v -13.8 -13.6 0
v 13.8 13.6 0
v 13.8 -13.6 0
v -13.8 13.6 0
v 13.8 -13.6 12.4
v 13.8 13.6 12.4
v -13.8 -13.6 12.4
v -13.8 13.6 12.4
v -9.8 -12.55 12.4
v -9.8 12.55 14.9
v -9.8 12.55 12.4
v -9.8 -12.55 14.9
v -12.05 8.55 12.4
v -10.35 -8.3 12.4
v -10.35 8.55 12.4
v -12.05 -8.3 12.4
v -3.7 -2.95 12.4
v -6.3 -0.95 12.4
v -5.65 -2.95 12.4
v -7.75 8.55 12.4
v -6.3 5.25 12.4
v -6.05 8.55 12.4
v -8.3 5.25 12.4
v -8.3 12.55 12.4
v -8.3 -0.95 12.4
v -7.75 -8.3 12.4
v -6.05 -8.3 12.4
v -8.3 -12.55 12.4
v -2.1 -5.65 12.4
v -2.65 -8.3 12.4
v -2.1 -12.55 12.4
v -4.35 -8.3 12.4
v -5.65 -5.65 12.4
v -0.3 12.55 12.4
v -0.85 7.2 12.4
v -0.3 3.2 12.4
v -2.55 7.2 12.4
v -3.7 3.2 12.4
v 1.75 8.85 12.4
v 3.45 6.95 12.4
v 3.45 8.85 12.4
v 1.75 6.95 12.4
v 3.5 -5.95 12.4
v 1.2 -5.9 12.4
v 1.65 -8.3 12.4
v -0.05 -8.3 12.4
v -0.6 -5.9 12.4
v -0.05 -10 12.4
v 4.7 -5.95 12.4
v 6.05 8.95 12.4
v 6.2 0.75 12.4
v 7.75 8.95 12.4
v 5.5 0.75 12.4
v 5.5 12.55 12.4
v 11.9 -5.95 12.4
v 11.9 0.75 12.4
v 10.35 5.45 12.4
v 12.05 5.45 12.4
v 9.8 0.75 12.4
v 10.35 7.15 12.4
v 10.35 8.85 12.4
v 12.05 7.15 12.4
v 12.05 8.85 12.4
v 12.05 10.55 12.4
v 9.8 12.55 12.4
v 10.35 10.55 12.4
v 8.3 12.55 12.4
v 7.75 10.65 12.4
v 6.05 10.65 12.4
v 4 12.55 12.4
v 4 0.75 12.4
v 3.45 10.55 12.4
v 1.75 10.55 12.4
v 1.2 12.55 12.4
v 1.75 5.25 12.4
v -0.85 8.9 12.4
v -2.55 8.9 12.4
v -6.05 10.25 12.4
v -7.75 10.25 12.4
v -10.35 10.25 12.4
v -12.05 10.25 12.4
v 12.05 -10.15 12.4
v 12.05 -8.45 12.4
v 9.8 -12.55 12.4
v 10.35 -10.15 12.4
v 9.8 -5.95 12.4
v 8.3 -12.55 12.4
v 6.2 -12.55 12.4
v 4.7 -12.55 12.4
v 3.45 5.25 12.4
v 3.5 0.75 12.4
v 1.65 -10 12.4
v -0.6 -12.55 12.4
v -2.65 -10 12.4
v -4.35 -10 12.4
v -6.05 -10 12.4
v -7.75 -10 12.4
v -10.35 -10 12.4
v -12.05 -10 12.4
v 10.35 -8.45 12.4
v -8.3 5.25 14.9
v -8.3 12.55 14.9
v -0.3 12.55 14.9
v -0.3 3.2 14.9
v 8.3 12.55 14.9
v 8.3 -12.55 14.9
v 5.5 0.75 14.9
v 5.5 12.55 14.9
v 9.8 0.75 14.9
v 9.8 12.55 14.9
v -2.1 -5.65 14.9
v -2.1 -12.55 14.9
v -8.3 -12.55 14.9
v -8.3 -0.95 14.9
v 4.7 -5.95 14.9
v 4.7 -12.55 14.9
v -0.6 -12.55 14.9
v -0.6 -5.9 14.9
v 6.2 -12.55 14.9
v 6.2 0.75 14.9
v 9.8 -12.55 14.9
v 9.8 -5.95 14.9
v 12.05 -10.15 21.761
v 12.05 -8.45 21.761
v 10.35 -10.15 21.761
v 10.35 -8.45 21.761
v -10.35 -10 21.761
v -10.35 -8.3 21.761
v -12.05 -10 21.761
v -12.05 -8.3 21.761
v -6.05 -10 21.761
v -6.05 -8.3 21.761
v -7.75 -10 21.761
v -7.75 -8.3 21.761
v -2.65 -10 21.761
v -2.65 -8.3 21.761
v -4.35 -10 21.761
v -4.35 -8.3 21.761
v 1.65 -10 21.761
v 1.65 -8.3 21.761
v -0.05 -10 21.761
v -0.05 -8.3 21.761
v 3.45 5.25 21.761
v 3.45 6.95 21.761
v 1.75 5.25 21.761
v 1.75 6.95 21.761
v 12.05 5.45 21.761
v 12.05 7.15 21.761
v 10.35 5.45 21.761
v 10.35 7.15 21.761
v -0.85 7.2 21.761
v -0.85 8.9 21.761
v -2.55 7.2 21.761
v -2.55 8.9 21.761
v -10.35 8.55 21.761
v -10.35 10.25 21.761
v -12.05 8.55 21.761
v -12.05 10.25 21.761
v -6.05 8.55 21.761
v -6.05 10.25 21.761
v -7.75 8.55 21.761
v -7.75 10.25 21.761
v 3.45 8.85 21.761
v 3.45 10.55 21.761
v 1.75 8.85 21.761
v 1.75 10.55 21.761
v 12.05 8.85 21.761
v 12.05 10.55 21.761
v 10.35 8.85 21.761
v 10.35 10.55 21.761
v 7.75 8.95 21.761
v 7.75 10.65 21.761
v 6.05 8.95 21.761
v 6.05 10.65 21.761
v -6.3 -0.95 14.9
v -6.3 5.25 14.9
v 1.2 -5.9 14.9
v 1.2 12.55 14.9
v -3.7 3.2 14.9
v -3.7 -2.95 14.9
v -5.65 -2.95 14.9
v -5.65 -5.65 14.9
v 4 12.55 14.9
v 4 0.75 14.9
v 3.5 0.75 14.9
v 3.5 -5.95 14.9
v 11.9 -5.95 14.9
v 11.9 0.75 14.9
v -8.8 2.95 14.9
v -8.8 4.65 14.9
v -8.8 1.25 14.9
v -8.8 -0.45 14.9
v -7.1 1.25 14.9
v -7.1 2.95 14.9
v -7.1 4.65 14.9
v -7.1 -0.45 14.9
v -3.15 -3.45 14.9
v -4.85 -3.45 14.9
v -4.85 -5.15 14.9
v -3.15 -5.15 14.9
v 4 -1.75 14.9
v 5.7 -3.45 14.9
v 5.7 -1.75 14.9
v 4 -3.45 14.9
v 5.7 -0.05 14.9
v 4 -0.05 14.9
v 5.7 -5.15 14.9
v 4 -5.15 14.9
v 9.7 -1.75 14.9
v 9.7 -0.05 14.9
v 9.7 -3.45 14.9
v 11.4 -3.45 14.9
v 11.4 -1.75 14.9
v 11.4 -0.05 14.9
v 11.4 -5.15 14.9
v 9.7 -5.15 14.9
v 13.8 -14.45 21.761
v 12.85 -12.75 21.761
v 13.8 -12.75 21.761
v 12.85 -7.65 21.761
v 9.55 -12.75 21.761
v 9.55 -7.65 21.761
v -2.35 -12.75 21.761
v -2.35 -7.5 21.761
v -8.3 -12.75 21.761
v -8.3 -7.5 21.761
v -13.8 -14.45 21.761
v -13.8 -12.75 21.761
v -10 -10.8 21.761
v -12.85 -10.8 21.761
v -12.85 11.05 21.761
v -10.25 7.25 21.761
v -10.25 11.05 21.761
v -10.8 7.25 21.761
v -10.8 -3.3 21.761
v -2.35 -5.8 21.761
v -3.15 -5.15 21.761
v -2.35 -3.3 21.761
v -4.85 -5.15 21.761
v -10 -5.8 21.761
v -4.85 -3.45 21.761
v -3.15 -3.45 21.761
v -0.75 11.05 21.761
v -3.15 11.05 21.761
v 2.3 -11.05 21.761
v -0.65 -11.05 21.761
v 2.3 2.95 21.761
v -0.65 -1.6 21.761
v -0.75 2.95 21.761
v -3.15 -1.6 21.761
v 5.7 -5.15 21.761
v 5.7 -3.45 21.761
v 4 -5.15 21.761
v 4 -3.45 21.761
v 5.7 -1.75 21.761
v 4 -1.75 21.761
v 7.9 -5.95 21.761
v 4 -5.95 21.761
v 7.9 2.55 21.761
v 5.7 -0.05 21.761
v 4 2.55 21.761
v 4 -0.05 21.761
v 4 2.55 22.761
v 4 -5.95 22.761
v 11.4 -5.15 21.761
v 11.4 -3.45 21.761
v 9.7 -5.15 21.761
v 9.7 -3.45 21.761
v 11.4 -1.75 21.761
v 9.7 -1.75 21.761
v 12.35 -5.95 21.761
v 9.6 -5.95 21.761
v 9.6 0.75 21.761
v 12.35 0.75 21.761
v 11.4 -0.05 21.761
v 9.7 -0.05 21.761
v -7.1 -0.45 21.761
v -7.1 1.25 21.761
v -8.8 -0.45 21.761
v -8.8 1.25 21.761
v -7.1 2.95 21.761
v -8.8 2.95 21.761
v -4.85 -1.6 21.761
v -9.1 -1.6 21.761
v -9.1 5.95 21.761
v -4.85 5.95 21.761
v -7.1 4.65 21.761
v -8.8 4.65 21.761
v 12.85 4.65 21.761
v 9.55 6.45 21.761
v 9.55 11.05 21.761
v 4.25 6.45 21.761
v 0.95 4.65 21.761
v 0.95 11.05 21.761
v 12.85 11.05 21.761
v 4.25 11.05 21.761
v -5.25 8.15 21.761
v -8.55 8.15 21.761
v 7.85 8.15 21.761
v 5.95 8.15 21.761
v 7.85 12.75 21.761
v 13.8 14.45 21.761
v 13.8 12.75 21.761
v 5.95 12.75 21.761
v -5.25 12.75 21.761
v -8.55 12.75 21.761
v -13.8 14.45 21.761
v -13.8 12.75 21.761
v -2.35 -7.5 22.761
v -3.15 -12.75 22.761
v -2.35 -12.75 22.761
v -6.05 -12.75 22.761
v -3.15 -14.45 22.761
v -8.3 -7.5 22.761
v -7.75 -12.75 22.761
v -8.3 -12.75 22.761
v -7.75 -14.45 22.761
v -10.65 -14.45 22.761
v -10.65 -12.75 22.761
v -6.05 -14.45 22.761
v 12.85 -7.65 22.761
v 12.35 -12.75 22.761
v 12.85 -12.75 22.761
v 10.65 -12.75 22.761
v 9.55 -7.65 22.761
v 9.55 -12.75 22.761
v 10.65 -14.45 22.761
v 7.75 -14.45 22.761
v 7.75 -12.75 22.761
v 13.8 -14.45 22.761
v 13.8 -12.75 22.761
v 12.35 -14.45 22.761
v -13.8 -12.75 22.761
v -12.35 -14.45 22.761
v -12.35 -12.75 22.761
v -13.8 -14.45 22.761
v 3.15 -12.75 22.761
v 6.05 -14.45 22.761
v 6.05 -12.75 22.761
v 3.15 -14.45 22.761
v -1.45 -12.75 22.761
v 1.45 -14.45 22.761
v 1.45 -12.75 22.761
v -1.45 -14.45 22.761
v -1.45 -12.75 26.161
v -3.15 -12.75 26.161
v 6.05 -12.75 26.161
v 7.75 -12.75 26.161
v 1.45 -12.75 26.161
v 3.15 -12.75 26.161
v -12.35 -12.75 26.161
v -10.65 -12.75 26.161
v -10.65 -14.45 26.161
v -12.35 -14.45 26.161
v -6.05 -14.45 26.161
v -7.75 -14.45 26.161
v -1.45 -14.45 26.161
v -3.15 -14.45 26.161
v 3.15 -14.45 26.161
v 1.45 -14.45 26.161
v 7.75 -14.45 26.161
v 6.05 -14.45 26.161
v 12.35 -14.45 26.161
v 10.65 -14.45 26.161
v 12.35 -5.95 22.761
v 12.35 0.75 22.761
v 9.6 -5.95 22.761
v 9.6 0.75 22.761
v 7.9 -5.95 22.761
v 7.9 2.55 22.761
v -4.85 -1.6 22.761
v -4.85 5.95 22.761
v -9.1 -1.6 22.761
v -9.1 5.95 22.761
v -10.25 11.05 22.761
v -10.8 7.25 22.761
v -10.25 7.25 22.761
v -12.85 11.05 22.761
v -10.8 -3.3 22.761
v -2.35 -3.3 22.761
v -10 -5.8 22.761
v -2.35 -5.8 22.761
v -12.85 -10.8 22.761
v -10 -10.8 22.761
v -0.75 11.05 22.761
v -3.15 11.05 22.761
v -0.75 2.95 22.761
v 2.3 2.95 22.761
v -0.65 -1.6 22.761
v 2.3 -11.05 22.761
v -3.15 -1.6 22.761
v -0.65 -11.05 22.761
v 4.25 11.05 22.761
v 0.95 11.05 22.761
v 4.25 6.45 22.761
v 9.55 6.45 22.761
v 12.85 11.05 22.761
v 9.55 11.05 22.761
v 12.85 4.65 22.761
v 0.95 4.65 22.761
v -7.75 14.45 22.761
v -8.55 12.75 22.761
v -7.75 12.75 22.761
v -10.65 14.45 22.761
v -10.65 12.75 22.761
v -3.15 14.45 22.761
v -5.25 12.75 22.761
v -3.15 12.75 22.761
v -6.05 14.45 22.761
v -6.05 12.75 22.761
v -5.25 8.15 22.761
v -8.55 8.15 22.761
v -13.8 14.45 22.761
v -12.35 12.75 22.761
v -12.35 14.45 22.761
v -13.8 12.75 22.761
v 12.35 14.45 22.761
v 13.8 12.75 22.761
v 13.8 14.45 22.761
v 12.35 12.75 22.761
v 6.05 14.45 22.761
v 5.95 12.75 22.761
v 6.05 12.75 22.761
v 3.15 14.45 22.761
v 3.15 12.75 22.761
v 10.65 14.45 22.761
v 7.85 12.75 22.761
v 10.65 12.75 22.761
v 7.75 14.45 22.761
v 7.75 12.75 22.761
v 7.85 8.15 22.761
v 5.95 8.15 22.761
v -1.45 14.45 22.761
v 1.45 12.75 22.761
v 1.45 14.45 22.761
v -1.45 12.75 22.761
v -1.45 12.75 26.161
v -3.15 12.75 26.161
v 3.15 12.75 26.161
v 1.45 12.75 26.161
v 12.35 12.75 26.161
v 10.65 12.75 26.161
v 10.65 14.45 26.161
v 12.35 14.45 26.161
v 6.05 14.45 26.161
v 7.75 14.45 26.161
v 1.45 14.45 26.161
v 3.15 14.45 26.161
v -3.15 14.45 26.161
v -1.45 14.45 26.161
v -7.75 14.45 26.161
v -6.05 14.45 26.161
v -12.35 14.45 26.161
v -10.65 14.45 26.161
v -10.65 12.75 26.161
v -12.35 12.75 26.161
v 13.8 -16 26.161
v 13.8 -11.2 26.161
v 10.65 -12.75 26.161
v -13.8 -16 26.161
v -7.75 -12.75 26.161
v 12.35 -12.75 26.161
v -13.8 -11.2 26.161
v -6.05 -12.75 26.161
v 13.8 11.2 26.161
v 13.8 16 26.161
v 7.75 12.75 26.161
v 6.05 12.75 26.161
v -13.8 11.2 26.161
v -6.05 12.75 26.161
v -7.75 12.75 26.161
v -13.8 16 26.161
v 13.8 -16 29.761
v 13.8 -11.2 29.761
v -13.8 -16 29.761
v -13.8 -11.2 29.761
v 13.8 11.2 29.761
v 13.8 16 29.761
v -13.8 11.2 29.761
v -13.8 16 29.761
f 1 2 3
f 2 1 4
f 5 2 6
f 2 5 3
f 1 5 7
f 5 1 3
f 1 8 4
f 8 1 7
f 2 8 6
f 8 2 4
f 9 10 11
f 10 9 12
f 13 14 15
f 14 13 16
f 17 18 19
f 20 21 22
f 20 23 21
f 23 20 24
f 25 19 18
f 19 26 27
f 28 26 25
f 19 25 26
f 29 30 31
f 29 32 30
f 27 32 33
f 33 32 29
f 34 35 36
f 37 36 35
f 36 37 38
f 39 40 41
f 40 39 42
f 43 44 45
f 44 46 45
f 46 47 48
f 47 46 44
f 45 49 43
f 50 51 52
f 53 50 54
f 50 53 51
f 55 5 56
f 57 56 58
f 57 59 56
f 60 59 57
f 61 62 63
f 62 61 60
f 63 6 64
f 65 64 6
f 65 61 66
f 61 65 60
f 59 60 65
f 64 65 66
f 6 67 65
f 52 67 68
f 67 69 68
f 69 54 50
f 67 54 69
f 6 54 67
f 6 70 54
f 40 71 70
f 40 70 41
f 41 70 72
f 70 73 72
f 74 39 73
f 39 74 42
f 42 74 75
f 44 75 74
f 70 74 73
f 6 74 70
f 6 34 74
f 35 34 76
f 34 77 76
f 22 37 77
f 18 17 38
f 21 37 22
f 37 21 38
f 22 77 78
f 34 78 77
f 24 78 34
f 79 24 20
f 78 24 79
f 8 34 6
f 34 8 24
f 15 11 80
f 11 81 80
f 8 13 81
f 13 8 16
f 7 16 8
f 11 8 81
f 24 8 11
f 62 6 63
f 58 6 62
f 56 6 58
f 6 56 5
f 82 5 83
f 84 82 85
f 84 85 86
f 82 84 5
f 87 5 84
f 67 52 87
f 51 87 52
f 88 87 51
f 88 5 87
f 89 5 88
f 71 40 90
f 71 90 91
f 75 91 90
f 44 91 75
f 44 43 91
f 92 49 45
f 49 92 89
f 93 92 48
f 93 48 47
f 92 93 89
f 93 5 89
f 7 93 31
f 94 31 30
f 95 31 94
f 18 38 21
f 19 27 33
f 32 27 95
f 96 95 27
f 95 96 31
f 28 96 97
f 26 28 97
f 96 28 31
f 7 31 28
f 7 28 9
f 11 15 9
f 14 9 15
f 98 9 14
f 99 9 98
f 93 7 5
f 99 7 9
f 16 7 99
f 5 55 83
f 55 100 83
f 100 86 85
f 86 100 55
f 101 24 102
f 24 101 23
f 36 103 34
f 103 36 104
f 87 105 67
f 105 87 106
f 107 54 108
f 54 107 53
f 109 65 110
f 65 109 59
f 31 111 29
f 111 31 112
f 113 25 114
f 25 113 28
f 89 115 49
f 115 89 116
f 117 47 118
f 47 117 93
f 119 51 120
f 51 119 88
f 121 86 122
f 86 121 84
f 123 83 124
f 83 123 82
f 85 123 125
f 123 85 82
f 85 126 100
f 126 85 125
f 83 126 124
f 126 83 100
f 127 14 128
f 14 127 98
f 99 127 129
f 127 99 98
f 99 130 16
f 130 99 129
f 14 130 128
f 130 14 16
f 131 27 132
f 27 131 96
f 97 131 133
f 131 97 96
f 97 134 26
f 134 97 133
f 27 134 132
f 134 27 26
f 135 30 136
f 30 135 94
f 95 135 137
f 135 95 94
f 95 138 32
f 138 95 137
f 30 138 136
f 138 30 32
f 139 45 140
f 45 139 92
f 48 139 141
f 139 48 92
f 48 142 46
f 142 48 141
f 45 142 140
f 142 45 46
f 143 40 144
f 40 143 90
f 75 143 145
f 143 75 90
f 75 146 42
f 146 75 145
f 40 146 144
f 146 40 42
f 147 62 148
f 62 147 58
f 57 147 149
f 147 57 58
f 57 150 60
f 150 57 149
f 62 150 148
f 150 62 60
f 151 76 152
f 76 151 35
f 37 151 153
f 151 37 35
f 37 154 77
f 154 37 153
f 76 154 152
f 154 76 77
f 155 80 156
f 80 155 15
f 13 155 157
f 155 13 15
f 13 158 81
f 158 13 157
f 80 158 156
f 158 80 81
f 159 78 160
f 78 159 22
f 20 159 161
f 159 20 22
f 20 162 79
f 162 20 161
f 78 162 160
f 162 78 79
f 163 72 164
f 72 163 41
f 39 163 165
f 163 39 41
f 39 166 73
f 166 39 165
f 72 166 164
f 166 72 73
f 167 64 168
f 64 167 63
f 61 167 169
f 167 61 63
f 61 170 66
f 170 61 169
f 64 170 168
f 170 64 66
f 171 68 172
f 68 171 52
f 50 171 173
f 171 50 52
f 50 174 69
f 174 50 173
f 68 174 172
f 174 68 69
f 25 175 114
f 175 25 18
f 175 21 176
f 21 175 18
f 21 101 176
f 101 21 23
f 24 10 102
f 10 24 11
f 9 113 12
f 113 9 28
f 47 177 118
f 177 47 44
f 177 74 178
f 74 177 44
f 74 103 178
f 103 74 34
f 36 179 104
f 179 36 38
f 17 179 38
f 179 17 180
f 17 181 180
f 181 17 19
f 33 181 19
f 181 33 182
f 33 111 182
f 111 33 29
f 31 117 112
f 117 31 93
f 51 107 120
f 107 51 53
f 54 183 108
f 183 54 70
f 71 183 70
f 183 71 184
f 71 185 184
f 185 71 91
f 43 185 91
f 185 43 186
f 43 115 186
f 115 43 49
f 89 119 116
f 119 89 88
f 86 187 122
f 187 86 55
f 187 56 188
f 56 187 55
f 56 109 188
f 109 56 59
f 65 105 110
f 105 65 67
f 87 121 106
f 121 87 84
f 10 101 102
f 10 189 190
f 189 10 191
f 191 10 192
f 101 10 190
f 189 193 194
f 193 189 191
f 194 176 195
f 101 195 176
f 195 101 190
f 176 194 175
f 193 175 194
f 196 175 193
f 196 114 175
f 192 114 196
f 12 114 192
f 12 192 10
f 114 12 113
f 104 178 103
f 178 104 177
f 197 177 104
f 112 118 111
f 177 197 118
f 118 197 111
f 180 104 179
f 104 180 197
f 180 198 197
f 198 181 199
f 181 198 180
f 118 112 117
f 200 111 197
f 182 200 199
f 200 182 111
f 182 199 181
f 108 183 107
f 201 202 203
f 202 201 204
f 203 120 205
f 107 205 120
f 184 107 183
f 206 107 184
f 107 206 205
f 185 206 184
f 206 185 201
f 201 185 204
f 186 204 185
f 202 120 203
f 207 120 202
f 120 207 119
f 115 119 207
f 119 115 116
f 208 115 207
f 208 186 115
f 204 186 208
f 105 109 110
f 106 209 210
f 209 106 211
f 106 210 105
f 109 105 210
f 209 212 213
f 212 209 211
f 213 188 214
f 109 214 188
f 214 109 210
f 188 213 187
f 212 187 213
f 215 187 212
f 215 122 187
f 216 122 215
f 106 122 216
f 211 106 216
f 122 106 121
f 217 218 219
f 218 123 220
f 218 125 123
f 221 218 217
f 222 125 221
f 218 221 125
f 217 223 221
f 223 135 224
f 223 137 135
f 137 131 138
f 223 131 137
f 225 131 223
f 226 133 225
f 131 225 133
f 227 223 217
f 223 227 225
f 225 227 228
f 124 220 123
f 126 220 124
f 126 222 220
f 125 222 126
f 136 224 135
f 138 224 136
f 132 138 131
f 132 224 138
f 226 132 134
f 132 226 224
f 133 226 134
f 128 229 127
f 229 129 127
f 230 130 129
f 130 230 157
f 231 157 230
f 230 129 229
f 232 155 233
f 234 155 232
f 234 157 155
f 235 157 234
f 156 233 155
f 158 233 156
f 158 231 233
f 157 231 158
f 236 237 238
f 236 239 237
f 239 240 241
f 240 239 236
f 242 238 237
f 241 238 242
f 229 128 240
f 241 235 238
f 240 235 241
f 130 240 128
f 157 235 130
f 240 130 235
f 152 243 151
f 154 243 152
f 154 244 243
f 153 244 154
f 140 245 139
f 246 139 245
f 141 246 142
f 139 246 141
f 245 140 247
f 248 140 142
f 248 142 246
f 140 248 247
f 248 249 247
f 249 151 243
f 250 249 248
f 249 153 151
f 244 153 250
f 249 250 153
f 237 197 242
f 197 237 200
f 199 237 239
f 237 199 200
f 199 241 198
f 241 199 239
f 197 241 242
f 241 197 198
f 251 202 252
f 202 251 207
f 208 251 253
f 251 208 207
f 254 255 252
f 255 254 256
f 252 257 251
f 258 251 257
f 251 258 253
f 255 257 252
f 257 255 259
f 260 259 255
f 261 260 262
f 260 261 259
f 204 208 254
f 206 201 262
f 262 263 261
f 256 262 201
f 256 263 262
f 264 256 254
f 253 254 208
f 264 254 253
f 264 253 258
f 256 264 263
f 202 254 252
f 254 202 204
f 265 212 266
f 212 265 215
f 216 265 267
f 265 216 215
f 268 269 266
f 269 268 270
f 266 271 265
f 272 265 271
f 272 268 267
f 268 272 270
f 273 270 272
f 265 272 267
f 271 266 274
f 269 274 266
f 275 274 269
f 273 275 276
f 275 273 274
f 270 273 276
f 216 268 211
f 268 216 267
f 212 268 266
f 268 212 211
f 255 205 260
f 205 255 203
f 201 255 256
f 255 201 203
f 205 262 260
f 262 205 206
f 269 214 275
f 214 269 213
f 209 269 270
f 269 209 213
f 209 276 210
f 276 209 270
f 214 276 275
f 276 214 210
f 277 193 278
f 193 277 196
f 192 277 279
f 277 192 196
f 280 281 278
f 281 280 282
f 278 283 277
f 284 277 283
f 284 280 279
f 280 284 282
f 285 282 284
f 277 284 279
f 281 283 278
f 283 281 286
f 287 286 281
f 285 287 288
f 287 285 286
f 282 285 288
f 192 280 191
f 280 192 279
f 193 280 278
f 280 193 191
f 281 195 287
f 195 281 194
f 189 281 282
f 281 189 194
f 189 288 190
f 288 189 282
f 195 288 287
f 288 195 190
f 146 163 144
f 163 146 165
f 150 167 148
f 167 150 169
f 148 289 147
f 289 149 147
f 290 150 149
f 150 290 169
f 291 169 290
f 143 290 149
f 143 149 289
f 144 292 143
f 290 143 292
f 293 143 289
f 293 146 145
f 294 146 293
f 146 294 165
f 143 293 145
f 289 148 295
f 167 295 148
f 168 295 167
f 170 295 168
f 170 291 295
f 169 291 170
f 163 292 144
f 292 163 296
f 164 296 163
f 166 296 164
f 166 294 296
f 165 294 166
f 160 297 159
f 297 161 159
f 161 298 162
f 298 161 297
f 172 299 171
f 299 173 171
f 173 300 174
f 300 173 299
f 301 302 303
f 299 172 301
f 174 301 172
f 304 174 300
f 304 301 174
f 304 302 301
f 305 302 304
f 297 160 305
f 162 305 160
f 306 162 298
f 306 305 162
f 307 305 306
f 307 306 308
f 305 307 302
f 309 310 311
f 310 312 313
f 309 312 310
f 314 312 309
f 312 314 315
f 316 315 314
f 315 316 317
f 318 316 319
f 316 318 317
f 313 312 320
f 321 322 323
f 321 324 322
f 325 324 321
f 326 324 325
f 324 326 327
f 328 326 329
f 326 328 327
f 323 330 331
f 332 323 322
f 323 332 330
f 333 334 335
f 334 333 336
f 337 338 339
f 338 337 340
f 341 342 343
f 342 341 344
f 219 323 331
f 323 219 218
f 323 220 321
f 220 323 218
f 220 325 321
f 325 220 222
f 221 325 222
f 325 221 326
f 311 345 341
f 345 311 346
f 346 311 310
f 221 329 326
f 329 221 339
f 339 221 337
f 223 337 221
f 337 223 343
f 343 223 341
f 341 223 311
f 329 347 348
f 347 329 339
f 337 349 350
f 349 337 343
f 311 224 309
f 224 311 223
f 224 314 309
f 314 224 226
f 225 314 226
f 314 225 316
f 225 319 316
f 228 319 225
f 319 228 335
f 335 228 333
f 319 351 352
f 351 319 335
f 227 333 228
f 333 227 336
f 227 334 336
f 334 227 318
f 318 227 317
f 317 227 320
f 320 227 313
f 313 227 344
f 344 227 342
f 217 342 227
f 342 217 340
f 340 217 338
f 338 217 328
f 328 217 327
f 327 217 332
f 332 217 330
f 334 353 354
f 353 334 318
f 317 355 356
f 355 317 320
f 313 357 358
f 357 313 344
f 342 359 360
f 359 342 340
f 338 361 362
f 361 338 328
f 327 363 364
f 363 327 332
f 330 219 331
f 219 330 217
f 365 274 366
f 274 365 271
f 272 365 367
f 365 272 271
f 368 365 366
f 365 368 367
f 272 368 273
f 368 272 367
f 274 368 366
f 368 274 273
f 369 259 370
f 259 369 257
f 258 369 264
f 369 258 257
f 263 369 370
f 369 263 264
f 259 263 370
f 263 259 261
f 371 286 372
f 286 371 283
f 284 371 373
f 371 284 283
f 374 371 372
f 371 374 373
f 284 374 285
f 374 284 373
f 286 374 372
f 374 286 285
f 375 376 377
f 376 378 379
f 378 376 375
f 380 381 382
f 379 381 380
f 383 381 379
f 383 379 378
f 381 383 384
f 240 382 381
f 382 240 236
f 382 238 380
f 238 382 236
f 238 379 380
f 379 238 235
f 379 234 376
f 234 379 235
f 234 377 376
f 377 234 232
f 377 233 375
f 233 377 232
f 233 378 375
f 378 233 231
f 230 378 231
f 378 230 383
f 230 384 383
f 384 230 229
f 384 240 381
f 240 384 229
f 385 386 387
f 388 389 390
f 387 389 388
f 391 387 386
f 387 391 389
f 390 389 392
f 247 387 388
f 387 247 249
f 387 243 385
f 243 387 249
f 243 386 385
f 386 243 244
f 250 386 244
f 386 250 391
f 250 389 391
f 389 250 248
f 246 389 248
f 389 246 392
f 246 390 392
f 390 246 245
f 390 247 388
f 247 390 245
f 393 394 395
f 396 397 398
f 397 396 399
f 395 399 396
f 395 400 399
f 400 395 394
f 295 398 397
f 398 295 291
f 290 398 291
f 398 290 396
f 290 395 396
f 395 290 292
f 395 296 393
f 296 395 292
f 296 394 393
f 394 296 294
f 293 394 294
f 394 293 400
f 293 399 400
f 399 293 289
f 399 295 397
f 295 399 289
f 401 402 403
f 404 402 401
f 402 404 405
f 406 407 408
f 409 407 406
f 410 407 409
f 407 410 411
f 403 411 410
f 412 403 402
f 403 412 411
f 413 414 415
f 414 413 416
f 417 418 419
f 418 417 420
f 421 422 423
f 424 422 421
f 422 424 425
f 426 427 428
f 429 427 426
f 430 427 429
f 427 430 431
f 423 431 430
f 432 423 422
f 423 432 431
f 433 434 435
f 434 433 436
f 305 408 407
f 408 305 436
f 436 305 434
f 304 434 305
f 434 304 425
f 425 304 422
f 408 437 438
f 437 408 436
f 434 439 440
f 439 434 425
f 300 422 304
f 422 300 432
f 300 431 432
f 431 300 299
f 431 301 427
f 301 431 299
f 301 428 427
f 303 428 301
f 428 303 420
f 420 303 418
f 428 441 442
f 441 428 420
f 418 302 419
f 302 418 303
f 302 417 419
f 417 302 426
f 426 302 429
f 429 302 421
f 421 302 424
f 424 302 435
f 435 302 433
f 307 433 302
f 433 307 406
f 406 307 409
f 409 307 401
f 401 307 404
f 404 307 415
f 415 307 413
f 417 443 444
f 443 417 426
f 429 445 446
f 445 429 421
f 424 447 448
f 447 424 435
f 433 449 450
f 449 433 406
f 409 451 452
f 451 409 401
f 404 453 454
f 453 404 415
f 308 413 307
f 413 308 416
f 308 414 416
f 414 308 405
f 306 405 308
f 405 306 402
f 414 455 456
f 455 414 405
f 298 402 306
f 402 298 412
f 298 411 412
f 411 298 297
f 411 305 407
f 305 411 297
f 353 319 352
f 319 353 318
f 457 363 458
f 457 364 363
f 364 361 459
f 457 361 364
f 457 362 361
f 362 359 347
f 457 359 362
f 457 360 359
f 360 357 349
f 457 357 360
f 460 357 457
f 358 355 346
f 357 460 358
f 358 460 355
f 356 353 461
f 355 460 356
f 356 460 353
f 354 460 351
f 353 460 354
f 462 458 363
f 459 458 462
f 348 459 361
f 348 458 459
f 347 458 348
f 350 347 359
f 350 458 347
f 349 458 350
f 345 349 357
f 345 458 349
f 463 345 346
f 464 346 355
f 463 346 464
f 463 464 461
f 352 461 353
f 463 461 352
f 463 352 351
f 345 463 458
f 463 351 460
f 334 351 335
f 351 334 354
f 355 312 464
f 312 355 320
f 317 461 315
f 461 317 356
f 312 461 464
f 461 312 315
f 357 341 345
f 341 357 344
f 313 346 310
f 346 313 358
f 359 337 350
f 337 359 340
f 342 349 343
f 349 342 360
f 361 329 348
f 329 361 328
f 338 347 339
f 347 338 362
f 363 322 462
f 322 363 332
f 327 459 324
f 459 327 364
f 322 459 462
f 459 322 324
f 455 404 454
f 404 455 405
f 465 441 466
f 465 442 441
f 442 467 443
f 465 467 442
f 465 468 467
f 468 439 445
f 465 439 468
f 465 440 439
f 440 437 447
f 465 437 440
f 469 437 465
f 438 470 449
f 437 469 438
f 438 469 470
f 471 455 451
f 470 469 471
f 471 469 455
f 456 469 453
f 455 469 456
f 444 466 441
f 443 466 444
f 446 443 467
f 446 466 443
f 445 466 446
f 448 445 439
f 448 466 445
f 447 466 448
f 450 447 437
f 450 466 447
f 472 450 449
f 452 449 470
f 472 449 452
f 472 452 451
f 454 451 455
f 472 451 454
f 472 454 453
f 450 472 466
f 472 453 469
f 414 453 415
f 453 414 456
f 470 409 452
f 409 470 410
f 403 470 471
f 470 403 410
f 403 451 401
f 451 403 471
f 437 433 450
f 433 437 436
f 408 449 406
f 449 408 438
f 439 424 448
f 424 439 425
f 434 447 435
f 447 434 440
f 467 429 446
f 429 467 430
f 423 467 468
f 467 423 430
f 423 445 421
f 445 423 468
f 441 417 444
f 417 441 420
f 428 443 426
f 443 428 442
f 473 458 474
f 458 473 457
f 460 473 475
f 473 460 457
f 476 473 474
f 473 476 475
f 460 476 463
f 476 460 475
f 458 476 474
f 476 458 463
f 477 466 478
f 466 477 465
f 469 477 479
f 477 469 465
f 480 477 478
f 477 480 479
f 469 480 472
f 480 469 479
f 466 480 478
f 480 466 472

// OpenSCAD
// Generated by SolidPython 0.4.2 on 2020-09-29 23:19:40
//!OpenSCAD

scale(v = 0.0100000000) {
	translate(v = [-1380, -1360, 0]) {
		union() {
			color(c = [0.4000000000, 0.4000000000, 0.4000000000]) {
				translate(v = [0, 0, 0]) {
					linear_extrude(height = 1000.0000000000) {
						polygon(paths = [[0, 1, 2, 3]], points = [[0, 0], [0, 2720], [2760, 2720], [2760, 0]]);
					}
				}
			}
			color(c = [0.2000000000, 0.6000000000, 0.2000000000]) {
				translate(v = [0, 0, 1000.0000000000]) {
					linear_extrude(height = 120.0000000000) {
						polygon(paths = [[0, 1, 2, 3]], points = [[0, 1305], [0, 2720], [2760, 2720], [2760, 1305]]);
					}
				}
			}
			color(c = [0.4000000000, 0.4000000000, 0.4000000000]) {
				translate(v = [0, 0, 1000.0000000000]) {
					linear_extrude(height = 120.0000000000) {
						polygon(paths = [[0, 1, 2, 3]], points = [[0, 0], [0, 1305], [2760, 1305], [2760, 0]]);
					}
				}
			}
			color(c = [0.9000000000, 0.6000000000, 0.6000000000]) {
				translate(v = [0, 0, 1120.0000000000]) {
					linear_extrude(height = 120.0000000000) {
						polygon(paths = [[0, 1, 2, 3]], points = [[135, 2065], [135, 2485], [400, 2485], [400, 2065]]);
					}
				}
			}
			color(c = [0.9000000000, 0.6000000000, 0.6000000000]) {
				translate(v = [0, 0, 1120.0000000000]) {
					linear_extrude(height = 120.0000000000) {
						polygon(paths = [[0, 1, 2, 3]], points = [[550, 2065], [550, 2485], [815, 2485], [815, 2065]]);
					}
				}
			}
			color(c = [0.9000000000, 0.6000000000, 0.6000000000]) {
				translate(v = [0, 0, 1120.0000000000]) {
					linear_extrude(height = 120.0000000000) {
						polygon(paths = [[0, 1, 2, 3]], points = [[1085, 1845], [1085, 2485], [1350, 2485], [1350, 1845]]);
					}
				}
			}
			color(c = [0.9000000000, 0.6000000000, 0.6000000000]) {
				translate(v = [0, 0, 1120.0000000000]) {
					linear_extrude(height = 120.0000000000) {
						polygon(paths = [[0, 1, 2, 3]], points = [[1500, 1845], [1500, 2485], [1780, 2485], [1780, 1845]]);
					}
				}
			}
			color(c = [0.9000000000, 0.6000000000, 0.6000000000]) {
				translate(v = [0, 0, 1120.0000000000]) {
					linear_extrude(height = 120.0000000000) {
						polygon(paths = [[0, 1, 2, 3]], points = [[1930, 1845], [1930, 2485], [2210, 2485], [2210, 1845]]);
					}
				}
			}
			color(c = [0.9000000000, 0.6000000000, 0.6000000000]) {
				translate(v = [0, 0, 1120.0000000000]) {
					linear_extrude(height = 120.0000000000) {
						polygon(paths = [[0, 1, 2, 3]], points = [[2360, 1845], [2360, 2485], [2625, 2485], [2625, 1845]]);
					}
				}
			}
			color(c = [0.9000000000, 0.6000000000, 0.9000000000]) {
				translate(v = [0, 0, 1120.0000000000]) {
					linear_extrude(height = 120.0000000000) {
						polygon(paths = [[0, 1, 2, 3]], points = [[135, 235], [135, 655], [400, 655], [400, 235]]);
					}
				}
			}
			color(c = [0.9000000000, 0.6000000000, 0.9000000000]) {
				translate(v = [0, 0, 1120.0000000000]) {
					linear_extrude(height = 120.0000000000) {
						polygon(paths = [[0, 1, 2, 3]], points = [[550, 235], [550, 655], [1170, 655], [1170, 235]]);
					}
				}
			}
			color(c = [0.9000000000, 0.6000000000, 0.9000000000]) {
				translate(v = [0, 0, 1120.0000000000]) {
					linear_extrude(height = 120.0000000000) {
						polygon(paths = [[0, 1, 2, 3]], points = [[1320, 235], [1320, 655], [1850, 655], [1850, 235]]);
					}
				}
			}
			color(c = [0.9000000000, 0.6000000000, 0.9000000000]) {
				translate(v = [0, 0, 1120.0000000000]) {
					linear_extrude(height = 120.0000000000) {
						polygon(paths = [[0, 1, 2, 3]], points = [[2000, 235], [2000, 655], [2210, 655], [2210, 235]]);
					}
				}
			}
			color(c = [0.9000000000, 0.6000000000, 0.9000000000]) {
				translate(v = [0, 0, 1120.0000000000]) {
					linear_extrude(height = 120.0000000000) {
						polygon(paths = [[0, 1, 2, 3]], points = [[2360, 235], [2360, 655], [2625, 655], [2625, 235]]);
					}
				}
			}
			color(c = [0.2000000000, 0.6000000000, 0.2000000000]) {
				translate(v = [0, 0, 1120.0000000000]) {
					linear_extrude(height = 120.0000000000) {
						difference() {
							polygon(paths = [[0, 1, 2, 3]], points = [[0, 1305], [0, 2720], [2760, 2720], [2760, 1305]]);
							polygon(paths = [[0, 1, 2, 3]], points = [[1085, 1845], [1350, 1845], [1350, 2485], [1085, 2485]]);
							polygon(paths = [[0, 1, 2, 3]], points = [[1500, 1845], [1780, 1845], [1780, 2485], [1500, 2485]]);
							polygon(paths = [[0, 1, 2, 3]], points = [[1930, 1845], [2210, 1845], [2210, 2485], [1930, 2485]]);
							polygon(paths = [[0, 1, 2, 3]], points = [[2360, 1845], [2625, 1845], [2625, 2485], [2360, 2485]]);
							polygon(paths = [[0, 1, 2, 3]], points = [[135, 2065], [400, 2065], [400, 2485], [135, 2485]]);
							polygon(paths = [[0, 1, 2, 3]], points = [[550, 2065], [815, 2065], [815, 2485], [550, 2485]]);
						}
					}
				}
			}
			color(c = [0.4000000000, 0.4000000000, 0.4000000000]) {
				translate(v = [0, 0, 1120.0000000000]) {
					linear_extrude(height = 120.0000000000) {
						difference() {
							polygon(paths = [[0, 1, 2, 3]], points = [[0, 0], [0, 1305], [2760, 1305], [2760, 0]]);
							polygon(paths = [[0, 1, 2, 3]], points = [[135, 235], [400, 235], [400, 655], [135, 655]]);
							polygon(paths = [[0, 1, 2, 3]], points = [[550, 235], [1170, 235], [1170, 655], [550, 655]]);
							polygon(paths = [[0, 1, 2, 3]], points = [[1320, 235], [1850, 235], [1850, 655], [1320, 655]]);
							polygon(paths = [[0, 1, 2, 3]], points = [[2000, 235], [2210, 235], [2210, 655], [2000, 655]]);
							polygon(paths = [[0, 1, 2, 3]], points = [[2360, 235], [2625, 235], [2625, 655], [2360, 655]]);
						}
					}
				}
			}
			color(c = [0.1000000000, 0.1000000000, 0.1000000000]) {
				translate(v = [0, 0, 1240.0000000000]) {
					linear_extrude(height = 70.0000000000) {
						polygon(paths = [[0, 1, 2, 3]], points = [[2415, 345], [2415, 515], [2585, 515], [2585, 345]]);
					}
				}
			}
			color(c = [0.1000000000, 0.1000000000, 0.1000000000]) {
				translate(v = [0, 0, 1240.0000000000]) {
					linear_extrude(height = 70.0000000000) {
						polygon(paths = [[0, 1, 2, 3]], points = [[175, 360], [175, 530], [345, 530], [345, 360]]);
					}
				}
			}
			color(c = [0.1000000000, 0.1000000000, 0.1000000000]) {
				translate(v = [0, 0, 1240.0000000000]) {
					linear_extrude(height = 70.0000000000) {
						polygon(paths = [[0, 1, 2, 3]], points = [[605, 360], [605, 530], [775, 530], [775, 360]]);
					}
				}
			}
			color(c = [0.1000000000, 0.1000000000, 0.1000000000]) {
				translate(v = [0, 0, 1240.0000000000]) {
					linear_extrude(height = 70.0000000000) {
						polygon(paths = [[0, 1, 2, 3]], points = [[945, 360], [945, 530], [1115, 530], [1115, 360]]);
					}
				}
			}
			color(c = [0.1000000000, 0.1000000000, 0.1000000000]) {
				translate(v = [0, 0, 1240.0000000000]) {
					linear_extrude(height = 70.0000000000) {
						polygon(paths = [[0, 1, 2, 3]], points = [[1375, 360], [1375, 530], [1545, 530], [1545, 360]]);
					}
				}
			}
			color(c = [0.1000000000, 0.1000000000, 0.1000000000]) {
				translate(v = [0, 0, 1240.0000000000]) {
					linear_extrude(height = 70.0000000000) {
						polygon(paths = [[0, 1, 2, 3]], points = [[1555, 1885], [1555, 2055], [1725, 2055], [1725, 1885]]);
					}
				}
			}
			color(c = [0.1000000000, 0.1000000000, 0.1000000000]) {
				translate(v = [0, 0, 1240.0000000000]) {
					linear_extrude(height = 70.0000000000) {
						polygon(paths = [[0, 1, 2, 3]], points = [[2415, 1905], [2415, 2075], [2585, 2075], [2585, 1905]]);
					}
				}
			}
			color(c = [0.1000000000, 0.1000000000, 0.1000000000]) {
				translate(v = [0, 0, 1240.0000000000]) {
					linear_extrude(height = 70.0000000000) {
						polygon(paths = [[0, 1, 2, 3]], points = [[1125, 2080], [1125, 2250], [1295, 2250], [1295, 2080]]);
					}
				}
			}
			color(c = [0.1000000000, 0.1000000000, 0.1000000000]) {
				translate(v = [0, 0, 1240.0000000000]) {
					linear_extrude(height = 70.0000000000) {
						polygon(paths = [[0, 1, 2, 3]], points = [[175, 2215], [175, 2385], [345, 2385], [345, 2215]]);
					}
				}
			}
			color(c = [0.1000000000, 0.1000000000, 0.1000000000]) {
				translate(v = [0, 0, 1240.0000000000]) {
					linear_extrude(height = 70.0000000000) {
						polygon(paths = [[0, 1, 2, 3]], points = [[605, 2215], [605, 2385], [775, 2385], [775, 2215]]);
					}
				}
			}
			color(c = [0.1000000000, 0.1000000000, 0.1000000000]) {
				translate(v = [0, 0, 1240.0000000000]) {
					linear_extrude(height = 70.0000000000) {
						polygon(paths = [[0, 1, 2, 3]], points = [[1555, 2245], [1555, 2415], [1725, 2415], [1725, 2245]]);
					}
				}
			}
			color(c = [0.1000000000, 0.1000000000, 0.1000000000]) {
				translate(v = [0, 0, 1240.0000000000]) {
					linear_extrude(height = 70.0000000000) {
						polygon(paths = [[0, 1, 2, 3]], points = [[2415, 2245], [2415, 2415], [2585, 2415], [2585, 2245]]);
					}
				}
			}
			color(c = [0.1000000000, 0.1000000000, 0.1000000000]) {
				translate(v = [0, 0, 1240.0000000000]) {
					linear_extrude(height = 70.0000000000) {
						polygon(paths = [[0, 1, 2, 3]], points = [[1985, 2255], [1985, 2425], [2155, 2425], [2155, 2255]]);
					}
				}
			}
			color(c = [1.0000000000, 1.0000000000, 1.0000000000]) {
				translate(v = [0, 0, 1240.0000000000]) {
					linear_extrude(height = 70.0000000000) {
						polygon(paths = [[0, 1, 2, 3, 4, 5, 6, 7]], points = [[400, 105], [400, 2615], [550, 2615], [550, 1885], [750, 1885], [750, 1265], [550, 1265], [550, 105]]);
					}
				}
			}
			color(c = [1.0000000000, 1.0000000000, 1.0000000000]) {
				translate(v = [0, 0, 1240.0000000000]) {
					linear_extrude(height = 70.0000000000) {
						polygon(paths = [[0, 1, 2, 3, 4, 5, 6, 7, 8, 9, 10, 11]], points = [[1170, 105], [1170, 795], [815, 795], [815, 1065], [1010, 1065], [1010, 1680], [1350, 1680], [1350, 2615], [1500, 2615], [1500, 770], [1320, 770], [1320, 105]]);
					}
				}
			}
			color(c = [1.0000000000, 1.0000000000, 1.0000000000]) {
				translate(v = [0, 0, 1240.0000000000]) {
					linear_extrude(height = 70.0000000000) {
						polygon(paths = [[0, 1, 2, 3, 4, 5, 6, 7, 8, 9]], points = [[1850, 105], [1850, 765], [1730, 765], [1730, 1435], [1780, 1435], [1780, 2615], [1930, 2615], [1930, 1435], [2000, 1435], [2000, 105]]);
					}
				}
			}
			color(c = [1.0000000000, 1.0000000000, 1.0000000000]) {
				translate(v = [0, 0, 1240.0000000000]) {
					linear_extrude(height = 70.0000000000) {
						polygon(paths = [[0, 1, 2, 3, 4, 5, 6, 7]], points = [[2210, 105], [2210, 2615], [2360, 2615], [2360, 1435], [2570, 1435], [2570, 765], [2360, 765], [2360, 105]]);
					}
				}
			}
			color(c = [0.1000000000, 0.1000000000, 0.1000000000]) {
				translate(v = [0, 0, 1310.0000000000]) {
					linear_extrude(height = 180.0000000000) {
						polygon(paths = [[0, 1, 2, 3]], points = [[2415, 345], [2415, 515], [2585, 515], [2585, 345]]);
					}
				}
			}
			color(c = [0.1000000000, 0.1000000000, 0.1000000000]) {
				translate(v = [0, 0, 1310.0000000000]) {
					linear_extrude(height = 180.0000000000) {
						polygon(paths = [[0, 1, 2, 3]], points = [[175, 360], [175, 530], [345, 530], [345, 360]]);
					}
				}
			}
			color(c = [0.1000000000, 0.1000000000, 0.1000000000]) {
				translate(v = [0, 0, 1310.0000000000]) {
					linear_extrude(height = 180.0000000000) {
						polygon(paths = [[0, 1, 2, 3]], points = [[605, 360], [605, 530], [775, 530], [775, 360]]);
					}
				}
			}
			color(c = [0.1000000000, 0.1000000000, 0.1000000000]) {
				translate(v = [0, 0, 1310.0000000000]) {
					linear_extrude(height = 180.0000000000) {
						polygon(paths = [[0, 1, 2, 3]], points = [[945, 360], [945, 530], [1115, 530], [1115, 360]]);
					}
				}
			}
			color(c = [0.1000000000, 0.1000000000, 0.1000000000]) {
				translate(v = [0, 0, 1310.0000000000]) {
					linear_extrude(height = 180.0000000000) {
						polygon(paths = [[0, 1, 2, 3]], points = [[1375, 360], [1375, 530], [1545, 530], [1545, 360]]);
					}
				}
			}
			color(c = [0.1000000000, 0.1000000000, 0.1000000000]) {
				translate(v = [0, 0, 1310.0000000000]) {
					linear_extrude(height = 180.0000000000) {
						polygon(paths = [[0, 1, 2, 3]], points = [[1555, 1885], [1555, 2055], [1725, 2055], [1725, 1885]]);
					}
				}
			}
			color(c = [0.1000000000, 0.1000000000, 0.1000000000]) {
				translate(v = [0, 0, 1310.0000000000]) {
					linear_extrude(height = 180.0000000000) {
						polygon(paths = [[0, 1, 2, 3]], points = [[2415, 1905], [2415, 2075], [2585, 2075], [2585, 1905]]);
					}
				}
			}
			color(c = [0.1000000000, 0.1000000000, 0.1000000000]) {
				translate(v = [0, 0, 1310.0000000000]) {
					linear_extrude(height = 180.0000000000) {
						polygon(paths = [[0, 1, 2, 3]], points = [[1125, 2080], [1125, 2250], [1295, 2250], [1295, 2080]]);
					}
				}
			}
			color(c = [0.1000000000, 0.1000000000, 0.1000000000]) {
				translate(v = [0, 0, 1310.0000000000]) {
					linear_extrude(height = 180.0000000000) {
						polygon(paths = [[0, 1, 2, 3]], points = [[175, 2215], [175, 2385], [345, 2385], [345, 2215]]);
					}
				}
			}
			color(c = [0.1000000000, 0.1000000000, 0.1000000000]) {
				translate(v = [0, 0, 1310.0000000000]) {
					linear_extrude(height = 180.0000000000) {
						polygon(paths = [[0, 1, 2, 3]], points = [[605, 2215], [605, 2385], [775, 2385], [775, 2215]]);
					}
				}
			}
			color(c = [0.1000000000, 0.1000000000, 0.1000000000]) {
				translate(v = [0, 0, 1310.0000000000]) {
					linear_extrude(height = 180.0000000000) {
						polygon(paths = [[0, 1, 2, 3]], points = [[1555, 2245], [1555, 2415], [1725, 2415], [1725, 2245]]);
					}
				}
			}
			color(c = [0.1000000000, 0.1000000000, 0.1000000000]) {
				translate(v = [0, 0, 1310.0000000000]) {
					linear_extrude(height = 180.0000000000) {
						polygon(paths = [[0, 1, 2, 3]], points = [[2415, 2245], [2415, 2415], [2585, 2415], [2585, 2245]]);
					}
				}
			}
			color(c = [0.1000000000, 0.1000000000, 0.1000000000]) {
				translate(v = [0, 0, 1310.0000000000]) {
					linear_extrude(height = 180.0000000000) {
						polygon(paths = [[0, 1, 2, 3]], points = [[1985, 2255], [1985, 2425], [2155, 2425], [2155, 2255]]);
					}
				}
			}
			color(c = [0.7000000000, 0, 0]) {
				translate(v = [0, 0, 1310.0000000000]) {
					linear_extrude(height = 180.0000000000) {
						polygon(paths = [[0, 1, 2, 3, 4, 5, 6, 7]], points = [[400, 105], [400, 2615], [550, 2615], [550, 1885], [750, 1885], [750, 1265], [550, 1265], [550, 105]]);
					}
				}
			}
			color(c = [0.7000000000, 0, 0]) {
				translate(v = [0, 0, 1310.0000000000]) {
					linear_extrude(height = 180.0000000000) {
						polygon(paths = [[0, 1, 2, 3, 4, 5, 6, 7, 8, 9, 10, 11]], points = [[1170, 105], [1170, 795], [815, 795], [815, 1065], [1010, 1065], [1010, 1680], [1350, 1680], [1350, 2615], [1500, 2615], [1500, 770], [1320, 770], [1320, 105]]);
					}
				}
			}
			color(c = [0.7000000000, 0, 0]) {
				translate(v = [0, 0, 1310.0000000000]) {
					linear_extrude(height = 180.0000000000) {
						polygon(paths = [[0, 1, 2, 3, 4, 5, 6, 7, 8, 9]], points = [[1850, 105], [1850, 765], [1730, 765], [1730, 1435], [1780, 1435], [1780, 2615], [1930, 2615], [1930, 1435], [2000, 1435], [2000, 105]]);
					}
				}
			}
			color(c = [0.7000000000, 0, 0]) {
				translate(v = [0, 0, 1310.0000000000]) {
					linear_extrude(height = 180.0000000000) {
						polygon(paths = [[0, 1, 2, 3, 4, 5, 6, 7]], points = [[2210, 105], [2210, 2615], [2360, 2615], [2360, 1435], [2570, 1435], [2570, 765], [2360, 765], [2360, 105]]);
					}
				}
			}
			color(c = [0.1000000000, 0.1000000000, 0.1000000000]) {
				translate(v = [0, 0, 1490.0000000000]) {
					linear_extrude(height = 686.1000000000) {
						polygon(paths = [[0, 1, 2, 3]], points = [[2415, 345], [2415, 515], [2585, 515], [2585, 345]]);
					}
				}
			}
			color(c = [0.1000000000, 0.1000000000, 0.1000000000]) {
				translate(v = [0, 0, 1490.0000000000]) {
					linear_extrude(height = 686.1000000000) {
						polygon(paths = [[0, 1, 2, 3]], points = [[175, 360], [175, 530], [345, 530], [345, 360]]);
					}
				}
			}
			color(c = [0.1000000000, 0.1000000000, 0.1000000000]) {
				translate(v = [0, 0, 1490.0000000000]) {
					linear_extrude(height = 686.1000000000) {
						polygon(paths = [[0, 1, 2, 3]], points = [[605, 360], [605, 530], [775, 530], [775, 360]]);
					}
				}
			}
			color(c = [0.1000000000, 0.1000000000, 0.1000000000]) {
				translate(v = [0, 0, 1490.0000000000]) {
					linear_extrude(height = 686.1000000000) {
						polygon(paths = [[0, 1, 2, 3]], points = [[945, 360], [945, 530], [1115, 530], [1115, 360]]);
					}
				}
			}
			color(c = [0.1000000000, 0.1000000000, 0.1000000000]) {
				translate(v = [0, 0, 1490.0000000000]) {
					linear_extrude(height = 686.1000000000) {
						polygon(paths = [[0, 1, 2, 3]], points = [[1375, 360], [1375, 530], [1545, 530], [1545, 360]]);
					}
				}
			}
			color(c = [0.1000000000, 0.1000000000, 0.1000000000]) {
				translate(v = [0, 0, 1490.0000000000]) {
					linear_extrude(height = 686.1000000000) {
						polygon(paths = [[0, 1, 2, 3]], points = [[895, 845], [895, 1015], [1065, 1015], [1065, 845]]);
					}
				}
			}
			color(c = [0.1000000000, 0.1000000000, 0.1000000000]) {
				translate(v = [0, 0, 1490.0000000000]) {
					linear_extrude(height = 686.1000000000) {
						polygon(paths = [[0, 1, 2, 3]], points = [[1780, 845], [1780, 1015], [1950, 1015], [1950, 845]]);
					}
				}
			}
			color(c = [0.1000000000, 0.1000000000, 0.1000000000]) {
				translate(v = [0, 0, 1490.0000000000]) {
					linear_extrude(height = 686.1000000000) {
						polygon(paths = [[0, 1, 2, 3]], points = [[2350, 845], [2350, 1015], [2520, 1015], [2520, 845]]);
					}
				}
			}
			color(c = [0.1000000000, 0.1000000000, 0.1000000000]) {
				translate(v = [0, 0, 1490.0000000000]) {
					linear_extrude(height = 686.1000000000) {
						polygon(paths = [[0, 1, 2, 3]], points = [[1780, 1185], [1780, 1355], [1950, 1355], [1950, 1185]]);
					}
				}
			}
			color(c = [0.1000000000, 0.1000000000, 0.1000000000]) {
				translate(v = [0, 0, 1490.0000000000]) {
					linear_extrude(height = 686.1000000000) {
						polygon(paths = [[0, 1, 2, 3]], points = [[2350, 1185], [2350, 1355], [2520, 1355], [2520, 1185]]);
					}
				}
			}
			color(c = [0.1000000000, 0.1000000000, 0.1000000000]) {
				translate(v = [0, 0, 1490.0000000000]) {
					linear_extrude(height = 686.1000000000) {
						polygon(paths = [[0, 1, 2, 3]], points = [[500, 1315], [500, 1485], [670, 1485], [670, 1315]]);
					}
				}
			}
			color(c = [0.1000000000, 0.1000000000, 0.1000000000]) {
				translate(v = [0, 0, 1490.0000000000]) {
					linear_extrude(height = 686.1000000000) {
						polygon(paths = [[0, 1, 2, 3]], points = [[500, 1655], [500, 1825], [670, 1825], [670, 1655]]);
					}
				}
			}
			color(c = [0.1000000000, 0.1000000000, 0.1000000000]) {
				translate(v = [0, 0, 1490.0000000000]) {
					linear_extrude(height = 686.1000000000) {
						polygon(paths = [[0, 1, 2, 3]], points = [[1555, 1885], [1555, 2055], [1725, 2055], [1725, 1885]]);
					}
				}
			}
			color(c = [0.1000000000, 0.1000000000, 0.1000000000]) {
				translate(v = [0, 0, 1490.0000000000]) {
					linear_extrude(height = 686.1000000000) {
						polygon(paths = [[0, 1, 2, 3]], points = [[2415, 1905], [2415, 2075], [2585, 2075], [2585, 1905]]);
					}
				}
			}
			color(c = [0.1000000000, 0.1000000000, 0.1000000000]) {
				translate(v = [0, 0, 1490.0000000000]) {
					linear_extrude(height = 686.1000000000) {
						polygon(paths = [[0, 1, 2, 3]], points = [[1125, 2080], [1125, 2250], [1295, 2250], [1295, 2080]]);
					}
				}
			}
			color(c = [0.1000000000, 0.1000000000, 0.1000000000]) {
				translate(v = [0, 0, 1490.0000000000]) {
					linear_extrude(height = 686.1000000000) {
						polygon(paths = [[0, 1, 2, 3]], points = [[175, 2215], [175, 2385], [345, 2385], [345, 2215]]);
					}
				}
			}
			color(c = [0.1000000000, 0.1000000000, 0.1000000000]) {
				translate(v = [0, 0, 1490.0000000000]) {
					linear_extrude(height = 686.1000000000) {
						polygon(paths = [[0, 1, 2, 3]], points = [[605, 2215], [605, 2385], [775, 2385], [775, 2215]]);
					}
				}
			}
			color(c = [0.1000000000, 0.1000000000, 0.1000000000]) {
				translate(v = [0, 0, 1490.0000000000]) {
					linear_extrude(height = 686.1000000000) {
						polygon(paths = [[0, 1, 2, 3]], points = [[1555, 2245], [1555, 2415], [1725, 2415], [1725, 2245]]);
					}
				}
			}
			color(c = [0.1000000000, 0.1000000000, 0.1000000000]) {
				translate(v = [0, 0, 1490.0000000000]) {
					linear_extrude(height = 686.1000000000) {
						polygon(paths = [[0, 1, 2, 3]], points = [[2415, 2245], [2415, 2415], [2585, 2415], [2585, 2245]]);
					}
				}
			}
			color(c = [0.1000000000, 0.1000000000, 0.1000000000]) {
				translate(v = [0, 0, 1490.0000000000]) {
					linear_extrude(height = 686.1000000000) {
						polygon(paths = [[0, 1, 2, 3]], points = [[1985, 2255], [1985, 2425], [2155, 2425], [2155, 2255]]);
					}
				}
			}
			color(c = [0.9000000000, 0.6000000000, 0.6000000000]) {
				translate(v = [0, 0, 2176.1000000000]) {
					linear_extrude(height = 100.0000000000) {
						polygon(paths = [[0, 1, 2, 3, 4, 5, 6, 7, 8, 9, 10, 11]], points = [[0, -85], [0, 85], [550, 85], [550, 610], [1145, 610], [1145, 85], [2335, 85], [2335, 595], [2665, 595], [2665, 85], [2760, 85], [2760, -85]]);
					}
				}
			}
			color(c = [0.9000000000, 0.6000000000, 0.6000000000]) {
				translate(v = [0, 0, 2176.1000000000]) {
					linear_extrude(height = 100.0000000000) {
						polygon(paths = [[0, 1, 2, 3]], points = [[2340, 765], [2340, 1435], [2615, 1435], [2615, 765]]);
					}
				}
			}
			color(c = [0.9000000000, 0.6000000000, 0.6000000000]) {
				translate(v = [0, 0, 2176.1000000000]) {
					linear_extrude(height = 100.0000000000) {
						polygon(paths = [[0, 1, 2, 3]], points = [[1780, 765], [1780, 1615], [2170, 1615], [2170, 765]]);
					}
				}
			}
			color(c = [0.9000000000, 0.6000000000, 0.6000000000]) {
				translate(v = [0, 0, 2176.1000000000]) {
					linear_extrude(height = 100.0000000000) {
						polygon(paths = [[0, 1, 2, 3]], points = [[470, 1200], [470, 1955], [895, 1955], [895, 1200]]);
					}
				}
			}
			color(c = [0.9000000000, 0.6000000000, 0.6000000000]) {
				translate(v = [0, 0, 2176.1000000000]) {
					linear_extrude(height = 100.0000000000) {
						polygon(paths = [[0, 1, 2, 3, 4, 5, 6, 7, 8, 9]], points = [[95, 280], [95, 2465], [355, 2465], [355, 2085], [300, 2085], [300, 1030], [1145, 1030], [1145, 780], [380, 780], [380, 280]]);
					}
				}
			}
			color(c = [0.9000000000, 0.6000000000, 0.6000000000]) {
				translate(v = [0, 0, 2176.1000000000]) {
					linear_extrude(height = 100.0000000000) {
						polygon(paths = [[0, 1, 2, 3, 4, 5, 6, 7]], points = [[1315, 255], [1315, 1200], [1065, 1200], [1065, 2465], [1305, 2465], [1305, 1655], [1610, 1655], [1610, 255]]);
					}
				}
			}
			color(c = [0.9000000000, 0.6000000000, 0.6000000000]) {
				translate(v = [0, 0, 2176.1000000000]) {
					linear_extrude(height = 100.0000000000) {
						polygon(paths = [[0, 1, 2, 3, 4, 5, 6, 7]], points = [[1475, 1825], [1475, 2465], [1805, 2465], [1805, 2005], [2335, 2005], [2335, 2465], [2665, 2465], [2665, 1825]]);
					}
				}
			}
			color(c = [0.9000000000, 0.6000000000, 0.6000000000]) {
				translate(v = [0, 0, 2176.1000000000]) {
					linear_extrude(height = 100.0000000000) {
						polygon(paths = [[0, 1, 2, 3, 4, 5, 6, 7, 8, 9, 10, 11]], points = [[525, 2175], [525, 2635], [0, 2635], [0, 2805], [2760, 2805], [2760, 2635], [2165, 2635], [2165, 2175], [1975, 2175], [1975, 2635], [855, 2635], [855, 2175]]);
					}
				}
			}
			color(c = [0.5000000000, 0.5000000000, 0.5000000000]) {
				translate(v = [0, 0, 2276.1000000000]) {
					linear_extrude(height = 340.0000000000) {
						polygon(paths = [[0, 1, 2, 3]], points = [[145, -85], [145, 85], [315, 85], [315, -85]]);
					}
				}
			}
			color(c = [0.5000000000, 0.5000000000, 0.5000000000]) {
				translate(v = [0, 0, 2276.1000000000]) {
					linear_extrude(height = 340.0000000000) {
						polygon(paths = [[0, 1, 2, 3]], points = [[605, -85], [605, 85], [775, 85], [775, -85]]);
					}
				}
			}
			color(c = [0.5000000000, 0.5000000000, 0.5000000000]) {
				translate(v = [0, 0, 2276.1000000000]) {
					linear_extrude(height = 340.0000000000) {
						polygon(paths = [[0, 1, 2, 3]], points = [[1065, -85], [1065, 85], [1235, 85], [1235, -85]]);
					}
				}
			}
			color(c = [0.5000000000, 0.5000000000, 0.5000000000]) {
				translate(v = [0, 0, 2276.1000000000]) {
					linear_extrude(height = 340.0000000000) {
						polygon(paths = [[0, 1, 2, 3]], points = [[1525, -85], [1525, 85], [1695, 85], [1695, -85]]);
					}
				}
			}
			color(c = [0.5000000000, 0.5000000000, 0.5000000000]) {
				translate(v = [0, 0, 2276.1000000000]) {
					linear_extrude(height = 340.0000000000) {
						polygon(paths = [[0, 1, 2, 3]], points = [[1985, -85], [1985, 85], [2155, 85], [2155, -85]]);
					}
				}
			}
			color(c = [0.5000000000, 0.5000000000, 0.5000000000]) {
				translate(v = [0, 0, 2276.1000000000]) {
					linear_extrude(height = 340.0000000000) {
						polygon(paths = [[0, 1, 2, 3]], points = [[2445, -85], [2445, 85], [2615, 85], [2615, -85]]);
					}
				}
			}
			color(c = [0.5000000000, 0.5000000000, 0.5000000000]) {
				translate(v = [0, 0, 2276.1000000000]) {
					linear_extrude(height = 340.0000000000) {
						polygon(paths = [[0, 1, 2, 3]], points = [[145, 2635], [145, 2805], [315, 2805], [315, 2635]]);
					}
				}
			}
			color(c = [0.5000000000, 0.5000000000, 0.5000000000]) {
				translate(v = [0, 0, 2276.1000000000]) {
					linear_extrude(height = 340.0000000000) {
						polygon(paths = [[0, 1, 2, 3]], points = [[605, 2635], [605, 2805], [775, 2805], [775, 2635]]);
					}
				}
			}
			color(c = [0.5000000000, 0.5000000000, 0.5000000000]) {
				translate(v = [0, 0, 2276.1000000000]) {
					linear_extrude(height = 340.0000000000) {
						polygon(paths = [[0, 1, 2, 3]], points = [[1065, 2635], [1065, 2805], [1235, 2805], [1235, 2635]]);
					}
				}
			}
			color(c = [0.5000000000, 0.5000000000, 0.5000000000]) {
				translate(v = [0, 0, 2276.1000000000]) {
					linear_extrude(height = 340.0000000000) {
						polygon(paths = [[0, 1, 2, 3]], points = [[1525, 2635], [1525, 2805], [1695, 2805], [1695, 2635]]);
					}
				}
			}
			color(c = [0.5000000000, 0.5000000000, 0.5000000000]) {
				translate(v = [0, 0, 2276.1000000000]) {
					linear_extrude(height = 340.0000000000) {
						polygon(paths = [[0, 1, 2, 3]], points = [[1985, 2635], [1985, 2805], [2155, 2805], [2155, 2635]]);
					}
				}
			}
			color(c = [0.5000000000, 0.5000000000, 0.5000000000]) {
				translate(v = [0, 0, 2276.1000000000]) {
					linear_extrude(height = 340.0000000000) {
						polygon(paths = [[0, 1, 2, 3]], points = [[2445, 2635], [2445, 2805], [2615, 2805], [2615, 2635]]);
					}
				}
			}
			color(c = [0.3000000000, 0.3000000000, 1]) {
				translate(v = [0, 0, 2616.1000000000]) {
					linear_extrude(height = 360.0000000000) {
						polygon(paths = [[0, 1, 2, 3]], points = [[0, -240], [0, 240], [2760, 240], [2760, -240]]);
					}
				}
			}
			color(c = [0.3000000000, 0.3000000000, 1]) {
				translate(v = [0, 0, 2616.1000000000]) {
					linear_extrude(height = 360.0000000000) {
						polygon(paths = [[0, 1, 2, 3]], points = [[0, 2480], [0, 2960], [2760, 2960], [2760, 2480]]);
					}
				}
			}
		}
	}
}
